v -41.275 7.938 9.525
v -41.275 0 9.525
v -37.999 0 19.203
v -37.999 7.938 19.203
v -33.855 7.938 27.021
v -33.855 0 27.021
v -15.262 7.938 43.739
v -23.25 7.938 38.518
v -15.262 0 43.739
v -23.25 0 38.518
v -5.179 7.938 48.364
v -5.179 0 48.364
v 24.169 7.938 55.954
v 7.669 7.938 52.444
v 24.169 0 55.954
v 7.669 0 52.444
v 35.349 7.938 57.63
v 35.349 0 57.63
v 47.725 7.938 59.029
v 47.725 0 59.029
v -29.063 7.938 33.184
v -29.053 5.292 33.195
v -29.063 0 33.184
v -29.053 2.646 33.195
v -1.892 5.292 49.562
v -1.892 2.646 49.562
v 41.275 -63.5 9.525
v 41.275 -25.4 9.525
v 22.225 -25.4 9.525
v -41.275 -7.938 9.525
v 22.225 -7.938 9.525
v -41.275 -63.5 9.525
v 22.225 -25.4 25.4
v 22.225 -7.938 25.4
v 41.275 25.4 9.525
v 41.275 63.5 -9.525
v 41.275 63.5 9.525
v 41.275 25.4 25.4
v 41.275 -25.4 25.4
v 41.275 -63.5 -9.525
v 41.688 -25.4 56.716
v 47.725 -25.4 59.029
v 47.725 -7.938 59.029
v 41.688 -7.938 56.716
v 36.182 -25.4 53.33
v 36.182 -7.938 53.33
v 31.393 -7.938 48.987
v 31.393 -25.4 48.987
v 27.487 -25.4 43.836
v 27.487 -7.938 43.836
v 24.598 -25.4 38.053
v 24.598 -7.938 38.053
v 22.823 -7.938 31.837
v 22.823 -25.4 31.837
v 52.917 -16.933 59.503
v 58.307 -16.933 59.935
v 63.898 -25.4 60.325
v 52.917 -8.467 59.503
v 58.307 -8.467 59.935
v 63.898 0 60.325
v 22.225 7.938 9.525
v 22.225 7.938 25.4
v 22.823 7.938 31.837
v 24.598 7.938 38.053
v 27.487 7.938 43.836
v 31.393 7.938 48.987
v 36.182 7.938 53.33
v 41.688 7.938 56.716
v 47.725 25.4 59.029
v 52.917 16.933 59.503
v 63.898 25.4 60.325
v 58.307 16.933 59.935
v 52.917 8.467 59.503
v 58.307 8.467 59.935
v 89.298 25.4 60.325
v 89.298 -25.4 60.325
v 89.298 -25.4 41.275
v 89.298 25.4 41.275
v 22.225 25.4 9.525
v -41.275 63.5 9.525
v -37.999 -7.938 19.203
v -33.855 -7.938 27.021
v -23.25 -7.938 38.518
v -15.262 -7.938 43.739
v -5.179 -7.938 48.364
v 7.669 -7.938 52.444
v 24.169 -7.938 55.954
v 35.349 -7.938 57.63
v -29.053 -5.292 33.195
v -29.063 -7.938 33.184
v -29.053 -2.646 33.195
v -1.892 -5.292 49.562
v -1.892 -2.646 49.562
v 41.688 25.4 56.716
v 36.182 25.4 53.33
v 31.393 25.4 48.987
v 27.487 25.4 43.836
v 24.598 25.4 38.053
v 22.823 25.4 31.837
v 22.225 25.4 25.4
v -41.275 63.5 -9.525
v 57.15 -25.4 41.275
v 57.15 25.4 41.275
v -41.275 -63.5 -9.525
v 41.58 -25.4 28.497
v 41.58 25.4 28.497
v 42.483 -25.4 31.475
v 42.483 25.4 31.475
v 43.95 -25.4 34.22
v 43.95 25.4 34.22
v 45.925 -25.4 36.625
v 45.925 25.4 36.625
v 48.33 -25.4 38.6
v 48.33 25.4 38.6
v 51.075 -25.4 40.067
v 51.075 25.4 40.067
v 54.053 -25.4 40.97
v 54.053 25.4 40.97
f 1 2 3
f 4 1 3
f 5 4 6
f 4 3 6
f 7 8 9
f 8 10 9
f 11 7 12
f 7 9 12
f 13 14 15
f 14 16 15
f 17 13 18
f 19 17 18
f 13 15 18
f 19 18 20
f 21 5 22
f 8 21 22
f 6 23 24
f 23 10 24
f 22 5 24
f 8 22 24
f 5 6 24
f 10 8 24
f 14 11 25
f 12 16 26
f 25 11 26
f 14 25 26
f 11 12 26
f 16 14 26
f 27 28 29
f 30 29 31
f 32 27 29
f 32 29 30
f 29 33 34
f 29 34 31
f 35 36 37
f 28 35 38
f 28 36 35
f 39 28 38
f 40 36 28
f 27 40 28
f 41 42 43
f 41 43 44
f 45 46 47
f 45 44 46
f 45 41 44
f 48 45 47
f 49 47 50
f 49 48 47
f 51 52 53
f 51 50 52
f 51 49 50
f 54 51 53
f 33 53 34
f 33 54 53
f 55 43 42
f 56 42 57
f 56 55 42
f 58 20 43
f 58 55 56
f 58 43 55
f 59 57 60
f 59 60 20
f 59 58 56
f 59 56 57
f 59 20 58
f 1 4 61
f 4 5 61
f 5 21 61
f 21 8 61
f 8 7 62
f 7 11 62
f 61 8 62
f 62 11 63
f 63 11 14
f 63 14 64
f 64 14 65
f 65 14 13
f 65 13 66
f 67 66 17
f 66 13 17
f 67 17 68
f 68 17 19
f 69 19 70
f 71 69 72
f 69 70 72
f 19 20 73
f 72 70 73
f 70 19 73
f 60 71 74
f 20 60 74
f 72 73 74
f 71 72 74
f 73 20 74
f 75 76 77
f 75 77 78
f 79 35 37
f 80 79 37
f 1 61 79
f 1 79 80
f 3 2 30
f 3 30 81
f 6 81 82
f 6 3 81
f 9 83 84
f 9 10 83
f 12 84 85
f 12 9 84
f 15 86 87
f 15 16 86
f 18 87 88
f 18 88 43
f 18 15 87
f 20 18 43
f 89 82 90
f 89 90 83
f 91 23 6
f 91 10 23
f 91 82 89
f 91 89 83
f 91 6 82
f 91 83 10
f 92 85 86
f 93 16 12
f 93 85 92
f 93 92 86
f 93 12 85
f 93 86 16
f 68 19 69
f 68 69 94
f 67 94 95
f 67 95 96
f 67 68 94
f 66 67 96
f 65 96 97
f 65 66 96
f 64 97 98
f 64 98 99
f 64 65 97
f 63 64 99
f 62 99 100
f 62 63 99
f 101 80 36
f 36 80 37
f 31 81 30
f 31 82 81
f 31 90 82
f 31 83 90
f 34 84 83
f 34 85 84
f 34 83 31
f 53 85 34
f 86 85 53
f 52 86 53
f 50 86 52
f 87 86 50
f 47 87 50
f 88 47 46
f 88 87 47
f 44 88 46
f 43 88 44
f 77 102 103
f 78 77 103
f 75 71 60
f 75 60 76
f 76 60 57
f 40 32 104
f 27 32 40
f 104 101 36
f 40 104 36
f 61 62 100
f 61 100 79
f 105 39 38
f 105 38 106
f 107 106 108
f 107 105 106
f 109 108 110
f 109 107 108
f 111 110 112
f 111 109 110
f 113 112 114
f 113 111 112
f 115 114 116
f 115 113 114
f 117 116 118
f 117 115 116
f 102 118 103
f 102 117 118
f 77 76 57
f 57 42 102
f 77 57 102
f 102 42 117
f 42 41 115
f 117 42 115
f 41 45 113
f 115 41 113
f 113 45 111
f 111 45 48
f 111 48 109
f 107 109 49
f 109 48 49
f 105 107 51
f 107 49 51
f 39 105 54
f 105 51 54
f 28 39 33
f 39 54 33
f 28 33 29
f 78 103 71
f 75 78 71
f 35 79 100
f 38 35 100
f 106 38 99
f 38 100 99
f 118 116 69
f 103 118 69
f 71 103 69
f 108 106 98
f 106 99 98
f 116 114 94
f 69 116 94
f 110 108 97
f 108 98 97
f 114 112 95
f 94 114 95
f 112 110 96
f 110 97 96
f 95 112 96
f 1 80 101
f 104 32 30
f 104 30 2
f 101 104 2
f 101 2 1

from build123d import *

# Parameters (mm, degrees)
F1_DEPTH = 63.5
F2_DEPTH = 25.4
F3_DEPTH = 7.9375
F4_DEPTH = 25.4


with BuildPart() as f1:
    # F0 (on Front) → F1 (new body, symmetric)
    with BuildSketch(Plane.XZ):
        Polygon((41.275, -9.525), (41.275, 9.525), (22.225, 9.525), (-41.275, 9.525), (-41.275, -9.525), align=None)
    extrude(amount=F1_DEPTH, both=True)

    # F0 (on Front) → F2 (join, symmetric)
    with BuildSketch(Plane.XZ):
        with BuildLine():
            Line((22.225, 9.525), (41.275, 9.525))
            Line((41.275, 9.525), (41.275, 25.4))
            ThreePointArc((41.275, 25.4), (45.92468, 36.62532), (57.15, 41.275))
            Line((57.15, 41.275), (63.898031, 41.275))
            Line((63.898031, 41.275), (63.898031, 60.325))
            add(Edge.make_bspline(
                [(47.724872, 59.029193), (52.819319, 59.523847), (58.204508, 59.955469), (63.898031, 60.325)],
                knots=[108.105541, 108.105541, 108.105541, 108.105541, 116.799, 116.799, 116.799, 116.799], degree=3))
            ThreePointArc((47.724872, 59.029193), (29.320805, 46.501932), (22.225, 25.4))
            Line((22.225, 25.4), (22.225, 9.525))
        make_face()
    extrude(amount=F2_DEPTH, both=True)

    # F0 (on Front) → F3 (join, symmetric)
    with BuildSketch(Plane.XZ):
        with BuildLine():
            Line((-41.275, 9.525), (22.225, 9.525))
            Line((22.225, 9.525), (22.225, 25.4))
            ThreePointArc((22.225, 25.4), (29.320805, 46.501932), (47.724872, 59.029193))
            add(Edge.make_bspline(
                [(-41.275, 9.525), (-34.017475, 36.97978), (-15.625963, 52.878028), (47.724872, 59.029193)],
                knots=[0, 0, 0, 0, 108.105541, 108.105541, 108.105541, 108.105541], degree=3))
        make_face()
    extrude(amount=F3_DEPTH, both=True)

    # F2_face (on face) → F4 (join)
    with BuildSketch(Plane(origin=(63.898031, 0, 50.8), x_dir=(0, 1, 0), z_dir=(1, 0, 0))):
        Polygon((25.4, -9.525), (25.4, 9.525), (0, 9.525), (-25.4, 9.525), (-25.4, -9.525), align=None)
    extrude(amount=F4_DEPTH)


solid = f1.part
